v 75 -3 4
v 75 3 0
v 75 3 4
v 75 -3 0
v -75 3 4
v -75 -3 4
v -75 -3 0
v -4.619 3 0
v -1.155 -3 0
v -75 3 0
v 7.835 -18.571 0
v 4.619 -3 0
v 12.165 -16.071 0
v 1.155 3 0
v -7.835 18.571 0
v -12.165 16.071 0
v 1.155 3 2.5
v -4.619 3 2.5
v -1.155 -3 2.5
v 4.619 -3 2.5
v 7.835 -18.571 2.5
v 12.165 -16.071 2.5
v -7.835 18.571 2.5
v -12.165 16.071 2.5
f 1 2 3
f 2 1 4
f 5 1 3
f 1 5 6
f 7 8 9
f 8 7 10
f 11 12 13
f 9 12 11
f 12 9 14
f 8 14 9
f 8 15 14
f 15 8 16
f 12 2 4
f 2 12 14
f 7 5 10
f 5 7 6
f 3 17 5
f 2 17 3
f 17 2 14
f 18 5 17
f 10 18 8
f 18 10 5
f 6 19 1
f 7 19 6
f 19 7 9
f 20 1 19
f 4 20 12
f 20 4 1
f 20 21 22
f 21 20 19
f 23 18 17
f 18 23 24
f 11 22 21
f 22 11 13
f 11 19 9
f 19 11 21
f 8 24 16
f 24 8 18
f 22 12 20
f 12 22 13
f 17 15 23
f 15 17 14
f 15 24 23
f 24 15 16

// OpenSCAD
// L-shaped (hockey-stick) cell spreader, printed lying flat (z=0 is the bed side)
$fn = 64;

// Handle (long bar)
handle_len   = 150;   // mm, x = 0 to 150
handle_w     = 6;     // mm, y = -3 to 3
handle_t     = 4;     // mm, z = 0 to 4

// Spreading foot (thin bar, 120° CCW from +X)
foot_len     = 40;    // mm, along its centre line
foot_w       = 5;     // mm, transverse width
foot_t       = 2.5;   // mm, z = 0 to 2.5 (smooth bed side)
foot_angle   = 120;   // deg, CCW from +X, seen from above

// Round boss joining the bars at the origin
boss_d       = 6;     // mm diameter
boss_t       = 4;     // mm tall

// Hanging hole through the handle
hole_d       = 4;     // mm diameter
hole_x       = 143;   // mm, centre x position
hole_y       = 0;     // mm, centre y position

// ---- Handle: x 0..150, y -3..3, z 0..4 ----
module handle() { translate([-handle_len/2, -handle_w/2, 0])
    cube([handle_len, handle_w, handle_t]); }

// ---- Spreading foot: 40 mm bar, 120° CCW, z 0..2.5 ----
// Local frame: +x_local = 120° direction, +y_local = 120°+90° (transverse)
module foot() { rotate([0, 0, foot_angle])
    translate([-foot_len/2, -foot_w/2, 0])
    cube([foot_len, foot_w, foot_t]); }

// ---- Round boss at the origin ----
module boss() { cylinder(h = boss_t, d = boss_d); }

// ---- Hanging hole through the handle (extends past faces) ----
module hole() { translate([hole_x, hole_y, -1])
    cylinder(h = handle_t + 2, d = hole_d); }

// ---- Assemble: union of bars + boss, then subtract the hole ----
difference() {
    union() {
        handle();
        foot();
        boss();
    }
    hole();
}
